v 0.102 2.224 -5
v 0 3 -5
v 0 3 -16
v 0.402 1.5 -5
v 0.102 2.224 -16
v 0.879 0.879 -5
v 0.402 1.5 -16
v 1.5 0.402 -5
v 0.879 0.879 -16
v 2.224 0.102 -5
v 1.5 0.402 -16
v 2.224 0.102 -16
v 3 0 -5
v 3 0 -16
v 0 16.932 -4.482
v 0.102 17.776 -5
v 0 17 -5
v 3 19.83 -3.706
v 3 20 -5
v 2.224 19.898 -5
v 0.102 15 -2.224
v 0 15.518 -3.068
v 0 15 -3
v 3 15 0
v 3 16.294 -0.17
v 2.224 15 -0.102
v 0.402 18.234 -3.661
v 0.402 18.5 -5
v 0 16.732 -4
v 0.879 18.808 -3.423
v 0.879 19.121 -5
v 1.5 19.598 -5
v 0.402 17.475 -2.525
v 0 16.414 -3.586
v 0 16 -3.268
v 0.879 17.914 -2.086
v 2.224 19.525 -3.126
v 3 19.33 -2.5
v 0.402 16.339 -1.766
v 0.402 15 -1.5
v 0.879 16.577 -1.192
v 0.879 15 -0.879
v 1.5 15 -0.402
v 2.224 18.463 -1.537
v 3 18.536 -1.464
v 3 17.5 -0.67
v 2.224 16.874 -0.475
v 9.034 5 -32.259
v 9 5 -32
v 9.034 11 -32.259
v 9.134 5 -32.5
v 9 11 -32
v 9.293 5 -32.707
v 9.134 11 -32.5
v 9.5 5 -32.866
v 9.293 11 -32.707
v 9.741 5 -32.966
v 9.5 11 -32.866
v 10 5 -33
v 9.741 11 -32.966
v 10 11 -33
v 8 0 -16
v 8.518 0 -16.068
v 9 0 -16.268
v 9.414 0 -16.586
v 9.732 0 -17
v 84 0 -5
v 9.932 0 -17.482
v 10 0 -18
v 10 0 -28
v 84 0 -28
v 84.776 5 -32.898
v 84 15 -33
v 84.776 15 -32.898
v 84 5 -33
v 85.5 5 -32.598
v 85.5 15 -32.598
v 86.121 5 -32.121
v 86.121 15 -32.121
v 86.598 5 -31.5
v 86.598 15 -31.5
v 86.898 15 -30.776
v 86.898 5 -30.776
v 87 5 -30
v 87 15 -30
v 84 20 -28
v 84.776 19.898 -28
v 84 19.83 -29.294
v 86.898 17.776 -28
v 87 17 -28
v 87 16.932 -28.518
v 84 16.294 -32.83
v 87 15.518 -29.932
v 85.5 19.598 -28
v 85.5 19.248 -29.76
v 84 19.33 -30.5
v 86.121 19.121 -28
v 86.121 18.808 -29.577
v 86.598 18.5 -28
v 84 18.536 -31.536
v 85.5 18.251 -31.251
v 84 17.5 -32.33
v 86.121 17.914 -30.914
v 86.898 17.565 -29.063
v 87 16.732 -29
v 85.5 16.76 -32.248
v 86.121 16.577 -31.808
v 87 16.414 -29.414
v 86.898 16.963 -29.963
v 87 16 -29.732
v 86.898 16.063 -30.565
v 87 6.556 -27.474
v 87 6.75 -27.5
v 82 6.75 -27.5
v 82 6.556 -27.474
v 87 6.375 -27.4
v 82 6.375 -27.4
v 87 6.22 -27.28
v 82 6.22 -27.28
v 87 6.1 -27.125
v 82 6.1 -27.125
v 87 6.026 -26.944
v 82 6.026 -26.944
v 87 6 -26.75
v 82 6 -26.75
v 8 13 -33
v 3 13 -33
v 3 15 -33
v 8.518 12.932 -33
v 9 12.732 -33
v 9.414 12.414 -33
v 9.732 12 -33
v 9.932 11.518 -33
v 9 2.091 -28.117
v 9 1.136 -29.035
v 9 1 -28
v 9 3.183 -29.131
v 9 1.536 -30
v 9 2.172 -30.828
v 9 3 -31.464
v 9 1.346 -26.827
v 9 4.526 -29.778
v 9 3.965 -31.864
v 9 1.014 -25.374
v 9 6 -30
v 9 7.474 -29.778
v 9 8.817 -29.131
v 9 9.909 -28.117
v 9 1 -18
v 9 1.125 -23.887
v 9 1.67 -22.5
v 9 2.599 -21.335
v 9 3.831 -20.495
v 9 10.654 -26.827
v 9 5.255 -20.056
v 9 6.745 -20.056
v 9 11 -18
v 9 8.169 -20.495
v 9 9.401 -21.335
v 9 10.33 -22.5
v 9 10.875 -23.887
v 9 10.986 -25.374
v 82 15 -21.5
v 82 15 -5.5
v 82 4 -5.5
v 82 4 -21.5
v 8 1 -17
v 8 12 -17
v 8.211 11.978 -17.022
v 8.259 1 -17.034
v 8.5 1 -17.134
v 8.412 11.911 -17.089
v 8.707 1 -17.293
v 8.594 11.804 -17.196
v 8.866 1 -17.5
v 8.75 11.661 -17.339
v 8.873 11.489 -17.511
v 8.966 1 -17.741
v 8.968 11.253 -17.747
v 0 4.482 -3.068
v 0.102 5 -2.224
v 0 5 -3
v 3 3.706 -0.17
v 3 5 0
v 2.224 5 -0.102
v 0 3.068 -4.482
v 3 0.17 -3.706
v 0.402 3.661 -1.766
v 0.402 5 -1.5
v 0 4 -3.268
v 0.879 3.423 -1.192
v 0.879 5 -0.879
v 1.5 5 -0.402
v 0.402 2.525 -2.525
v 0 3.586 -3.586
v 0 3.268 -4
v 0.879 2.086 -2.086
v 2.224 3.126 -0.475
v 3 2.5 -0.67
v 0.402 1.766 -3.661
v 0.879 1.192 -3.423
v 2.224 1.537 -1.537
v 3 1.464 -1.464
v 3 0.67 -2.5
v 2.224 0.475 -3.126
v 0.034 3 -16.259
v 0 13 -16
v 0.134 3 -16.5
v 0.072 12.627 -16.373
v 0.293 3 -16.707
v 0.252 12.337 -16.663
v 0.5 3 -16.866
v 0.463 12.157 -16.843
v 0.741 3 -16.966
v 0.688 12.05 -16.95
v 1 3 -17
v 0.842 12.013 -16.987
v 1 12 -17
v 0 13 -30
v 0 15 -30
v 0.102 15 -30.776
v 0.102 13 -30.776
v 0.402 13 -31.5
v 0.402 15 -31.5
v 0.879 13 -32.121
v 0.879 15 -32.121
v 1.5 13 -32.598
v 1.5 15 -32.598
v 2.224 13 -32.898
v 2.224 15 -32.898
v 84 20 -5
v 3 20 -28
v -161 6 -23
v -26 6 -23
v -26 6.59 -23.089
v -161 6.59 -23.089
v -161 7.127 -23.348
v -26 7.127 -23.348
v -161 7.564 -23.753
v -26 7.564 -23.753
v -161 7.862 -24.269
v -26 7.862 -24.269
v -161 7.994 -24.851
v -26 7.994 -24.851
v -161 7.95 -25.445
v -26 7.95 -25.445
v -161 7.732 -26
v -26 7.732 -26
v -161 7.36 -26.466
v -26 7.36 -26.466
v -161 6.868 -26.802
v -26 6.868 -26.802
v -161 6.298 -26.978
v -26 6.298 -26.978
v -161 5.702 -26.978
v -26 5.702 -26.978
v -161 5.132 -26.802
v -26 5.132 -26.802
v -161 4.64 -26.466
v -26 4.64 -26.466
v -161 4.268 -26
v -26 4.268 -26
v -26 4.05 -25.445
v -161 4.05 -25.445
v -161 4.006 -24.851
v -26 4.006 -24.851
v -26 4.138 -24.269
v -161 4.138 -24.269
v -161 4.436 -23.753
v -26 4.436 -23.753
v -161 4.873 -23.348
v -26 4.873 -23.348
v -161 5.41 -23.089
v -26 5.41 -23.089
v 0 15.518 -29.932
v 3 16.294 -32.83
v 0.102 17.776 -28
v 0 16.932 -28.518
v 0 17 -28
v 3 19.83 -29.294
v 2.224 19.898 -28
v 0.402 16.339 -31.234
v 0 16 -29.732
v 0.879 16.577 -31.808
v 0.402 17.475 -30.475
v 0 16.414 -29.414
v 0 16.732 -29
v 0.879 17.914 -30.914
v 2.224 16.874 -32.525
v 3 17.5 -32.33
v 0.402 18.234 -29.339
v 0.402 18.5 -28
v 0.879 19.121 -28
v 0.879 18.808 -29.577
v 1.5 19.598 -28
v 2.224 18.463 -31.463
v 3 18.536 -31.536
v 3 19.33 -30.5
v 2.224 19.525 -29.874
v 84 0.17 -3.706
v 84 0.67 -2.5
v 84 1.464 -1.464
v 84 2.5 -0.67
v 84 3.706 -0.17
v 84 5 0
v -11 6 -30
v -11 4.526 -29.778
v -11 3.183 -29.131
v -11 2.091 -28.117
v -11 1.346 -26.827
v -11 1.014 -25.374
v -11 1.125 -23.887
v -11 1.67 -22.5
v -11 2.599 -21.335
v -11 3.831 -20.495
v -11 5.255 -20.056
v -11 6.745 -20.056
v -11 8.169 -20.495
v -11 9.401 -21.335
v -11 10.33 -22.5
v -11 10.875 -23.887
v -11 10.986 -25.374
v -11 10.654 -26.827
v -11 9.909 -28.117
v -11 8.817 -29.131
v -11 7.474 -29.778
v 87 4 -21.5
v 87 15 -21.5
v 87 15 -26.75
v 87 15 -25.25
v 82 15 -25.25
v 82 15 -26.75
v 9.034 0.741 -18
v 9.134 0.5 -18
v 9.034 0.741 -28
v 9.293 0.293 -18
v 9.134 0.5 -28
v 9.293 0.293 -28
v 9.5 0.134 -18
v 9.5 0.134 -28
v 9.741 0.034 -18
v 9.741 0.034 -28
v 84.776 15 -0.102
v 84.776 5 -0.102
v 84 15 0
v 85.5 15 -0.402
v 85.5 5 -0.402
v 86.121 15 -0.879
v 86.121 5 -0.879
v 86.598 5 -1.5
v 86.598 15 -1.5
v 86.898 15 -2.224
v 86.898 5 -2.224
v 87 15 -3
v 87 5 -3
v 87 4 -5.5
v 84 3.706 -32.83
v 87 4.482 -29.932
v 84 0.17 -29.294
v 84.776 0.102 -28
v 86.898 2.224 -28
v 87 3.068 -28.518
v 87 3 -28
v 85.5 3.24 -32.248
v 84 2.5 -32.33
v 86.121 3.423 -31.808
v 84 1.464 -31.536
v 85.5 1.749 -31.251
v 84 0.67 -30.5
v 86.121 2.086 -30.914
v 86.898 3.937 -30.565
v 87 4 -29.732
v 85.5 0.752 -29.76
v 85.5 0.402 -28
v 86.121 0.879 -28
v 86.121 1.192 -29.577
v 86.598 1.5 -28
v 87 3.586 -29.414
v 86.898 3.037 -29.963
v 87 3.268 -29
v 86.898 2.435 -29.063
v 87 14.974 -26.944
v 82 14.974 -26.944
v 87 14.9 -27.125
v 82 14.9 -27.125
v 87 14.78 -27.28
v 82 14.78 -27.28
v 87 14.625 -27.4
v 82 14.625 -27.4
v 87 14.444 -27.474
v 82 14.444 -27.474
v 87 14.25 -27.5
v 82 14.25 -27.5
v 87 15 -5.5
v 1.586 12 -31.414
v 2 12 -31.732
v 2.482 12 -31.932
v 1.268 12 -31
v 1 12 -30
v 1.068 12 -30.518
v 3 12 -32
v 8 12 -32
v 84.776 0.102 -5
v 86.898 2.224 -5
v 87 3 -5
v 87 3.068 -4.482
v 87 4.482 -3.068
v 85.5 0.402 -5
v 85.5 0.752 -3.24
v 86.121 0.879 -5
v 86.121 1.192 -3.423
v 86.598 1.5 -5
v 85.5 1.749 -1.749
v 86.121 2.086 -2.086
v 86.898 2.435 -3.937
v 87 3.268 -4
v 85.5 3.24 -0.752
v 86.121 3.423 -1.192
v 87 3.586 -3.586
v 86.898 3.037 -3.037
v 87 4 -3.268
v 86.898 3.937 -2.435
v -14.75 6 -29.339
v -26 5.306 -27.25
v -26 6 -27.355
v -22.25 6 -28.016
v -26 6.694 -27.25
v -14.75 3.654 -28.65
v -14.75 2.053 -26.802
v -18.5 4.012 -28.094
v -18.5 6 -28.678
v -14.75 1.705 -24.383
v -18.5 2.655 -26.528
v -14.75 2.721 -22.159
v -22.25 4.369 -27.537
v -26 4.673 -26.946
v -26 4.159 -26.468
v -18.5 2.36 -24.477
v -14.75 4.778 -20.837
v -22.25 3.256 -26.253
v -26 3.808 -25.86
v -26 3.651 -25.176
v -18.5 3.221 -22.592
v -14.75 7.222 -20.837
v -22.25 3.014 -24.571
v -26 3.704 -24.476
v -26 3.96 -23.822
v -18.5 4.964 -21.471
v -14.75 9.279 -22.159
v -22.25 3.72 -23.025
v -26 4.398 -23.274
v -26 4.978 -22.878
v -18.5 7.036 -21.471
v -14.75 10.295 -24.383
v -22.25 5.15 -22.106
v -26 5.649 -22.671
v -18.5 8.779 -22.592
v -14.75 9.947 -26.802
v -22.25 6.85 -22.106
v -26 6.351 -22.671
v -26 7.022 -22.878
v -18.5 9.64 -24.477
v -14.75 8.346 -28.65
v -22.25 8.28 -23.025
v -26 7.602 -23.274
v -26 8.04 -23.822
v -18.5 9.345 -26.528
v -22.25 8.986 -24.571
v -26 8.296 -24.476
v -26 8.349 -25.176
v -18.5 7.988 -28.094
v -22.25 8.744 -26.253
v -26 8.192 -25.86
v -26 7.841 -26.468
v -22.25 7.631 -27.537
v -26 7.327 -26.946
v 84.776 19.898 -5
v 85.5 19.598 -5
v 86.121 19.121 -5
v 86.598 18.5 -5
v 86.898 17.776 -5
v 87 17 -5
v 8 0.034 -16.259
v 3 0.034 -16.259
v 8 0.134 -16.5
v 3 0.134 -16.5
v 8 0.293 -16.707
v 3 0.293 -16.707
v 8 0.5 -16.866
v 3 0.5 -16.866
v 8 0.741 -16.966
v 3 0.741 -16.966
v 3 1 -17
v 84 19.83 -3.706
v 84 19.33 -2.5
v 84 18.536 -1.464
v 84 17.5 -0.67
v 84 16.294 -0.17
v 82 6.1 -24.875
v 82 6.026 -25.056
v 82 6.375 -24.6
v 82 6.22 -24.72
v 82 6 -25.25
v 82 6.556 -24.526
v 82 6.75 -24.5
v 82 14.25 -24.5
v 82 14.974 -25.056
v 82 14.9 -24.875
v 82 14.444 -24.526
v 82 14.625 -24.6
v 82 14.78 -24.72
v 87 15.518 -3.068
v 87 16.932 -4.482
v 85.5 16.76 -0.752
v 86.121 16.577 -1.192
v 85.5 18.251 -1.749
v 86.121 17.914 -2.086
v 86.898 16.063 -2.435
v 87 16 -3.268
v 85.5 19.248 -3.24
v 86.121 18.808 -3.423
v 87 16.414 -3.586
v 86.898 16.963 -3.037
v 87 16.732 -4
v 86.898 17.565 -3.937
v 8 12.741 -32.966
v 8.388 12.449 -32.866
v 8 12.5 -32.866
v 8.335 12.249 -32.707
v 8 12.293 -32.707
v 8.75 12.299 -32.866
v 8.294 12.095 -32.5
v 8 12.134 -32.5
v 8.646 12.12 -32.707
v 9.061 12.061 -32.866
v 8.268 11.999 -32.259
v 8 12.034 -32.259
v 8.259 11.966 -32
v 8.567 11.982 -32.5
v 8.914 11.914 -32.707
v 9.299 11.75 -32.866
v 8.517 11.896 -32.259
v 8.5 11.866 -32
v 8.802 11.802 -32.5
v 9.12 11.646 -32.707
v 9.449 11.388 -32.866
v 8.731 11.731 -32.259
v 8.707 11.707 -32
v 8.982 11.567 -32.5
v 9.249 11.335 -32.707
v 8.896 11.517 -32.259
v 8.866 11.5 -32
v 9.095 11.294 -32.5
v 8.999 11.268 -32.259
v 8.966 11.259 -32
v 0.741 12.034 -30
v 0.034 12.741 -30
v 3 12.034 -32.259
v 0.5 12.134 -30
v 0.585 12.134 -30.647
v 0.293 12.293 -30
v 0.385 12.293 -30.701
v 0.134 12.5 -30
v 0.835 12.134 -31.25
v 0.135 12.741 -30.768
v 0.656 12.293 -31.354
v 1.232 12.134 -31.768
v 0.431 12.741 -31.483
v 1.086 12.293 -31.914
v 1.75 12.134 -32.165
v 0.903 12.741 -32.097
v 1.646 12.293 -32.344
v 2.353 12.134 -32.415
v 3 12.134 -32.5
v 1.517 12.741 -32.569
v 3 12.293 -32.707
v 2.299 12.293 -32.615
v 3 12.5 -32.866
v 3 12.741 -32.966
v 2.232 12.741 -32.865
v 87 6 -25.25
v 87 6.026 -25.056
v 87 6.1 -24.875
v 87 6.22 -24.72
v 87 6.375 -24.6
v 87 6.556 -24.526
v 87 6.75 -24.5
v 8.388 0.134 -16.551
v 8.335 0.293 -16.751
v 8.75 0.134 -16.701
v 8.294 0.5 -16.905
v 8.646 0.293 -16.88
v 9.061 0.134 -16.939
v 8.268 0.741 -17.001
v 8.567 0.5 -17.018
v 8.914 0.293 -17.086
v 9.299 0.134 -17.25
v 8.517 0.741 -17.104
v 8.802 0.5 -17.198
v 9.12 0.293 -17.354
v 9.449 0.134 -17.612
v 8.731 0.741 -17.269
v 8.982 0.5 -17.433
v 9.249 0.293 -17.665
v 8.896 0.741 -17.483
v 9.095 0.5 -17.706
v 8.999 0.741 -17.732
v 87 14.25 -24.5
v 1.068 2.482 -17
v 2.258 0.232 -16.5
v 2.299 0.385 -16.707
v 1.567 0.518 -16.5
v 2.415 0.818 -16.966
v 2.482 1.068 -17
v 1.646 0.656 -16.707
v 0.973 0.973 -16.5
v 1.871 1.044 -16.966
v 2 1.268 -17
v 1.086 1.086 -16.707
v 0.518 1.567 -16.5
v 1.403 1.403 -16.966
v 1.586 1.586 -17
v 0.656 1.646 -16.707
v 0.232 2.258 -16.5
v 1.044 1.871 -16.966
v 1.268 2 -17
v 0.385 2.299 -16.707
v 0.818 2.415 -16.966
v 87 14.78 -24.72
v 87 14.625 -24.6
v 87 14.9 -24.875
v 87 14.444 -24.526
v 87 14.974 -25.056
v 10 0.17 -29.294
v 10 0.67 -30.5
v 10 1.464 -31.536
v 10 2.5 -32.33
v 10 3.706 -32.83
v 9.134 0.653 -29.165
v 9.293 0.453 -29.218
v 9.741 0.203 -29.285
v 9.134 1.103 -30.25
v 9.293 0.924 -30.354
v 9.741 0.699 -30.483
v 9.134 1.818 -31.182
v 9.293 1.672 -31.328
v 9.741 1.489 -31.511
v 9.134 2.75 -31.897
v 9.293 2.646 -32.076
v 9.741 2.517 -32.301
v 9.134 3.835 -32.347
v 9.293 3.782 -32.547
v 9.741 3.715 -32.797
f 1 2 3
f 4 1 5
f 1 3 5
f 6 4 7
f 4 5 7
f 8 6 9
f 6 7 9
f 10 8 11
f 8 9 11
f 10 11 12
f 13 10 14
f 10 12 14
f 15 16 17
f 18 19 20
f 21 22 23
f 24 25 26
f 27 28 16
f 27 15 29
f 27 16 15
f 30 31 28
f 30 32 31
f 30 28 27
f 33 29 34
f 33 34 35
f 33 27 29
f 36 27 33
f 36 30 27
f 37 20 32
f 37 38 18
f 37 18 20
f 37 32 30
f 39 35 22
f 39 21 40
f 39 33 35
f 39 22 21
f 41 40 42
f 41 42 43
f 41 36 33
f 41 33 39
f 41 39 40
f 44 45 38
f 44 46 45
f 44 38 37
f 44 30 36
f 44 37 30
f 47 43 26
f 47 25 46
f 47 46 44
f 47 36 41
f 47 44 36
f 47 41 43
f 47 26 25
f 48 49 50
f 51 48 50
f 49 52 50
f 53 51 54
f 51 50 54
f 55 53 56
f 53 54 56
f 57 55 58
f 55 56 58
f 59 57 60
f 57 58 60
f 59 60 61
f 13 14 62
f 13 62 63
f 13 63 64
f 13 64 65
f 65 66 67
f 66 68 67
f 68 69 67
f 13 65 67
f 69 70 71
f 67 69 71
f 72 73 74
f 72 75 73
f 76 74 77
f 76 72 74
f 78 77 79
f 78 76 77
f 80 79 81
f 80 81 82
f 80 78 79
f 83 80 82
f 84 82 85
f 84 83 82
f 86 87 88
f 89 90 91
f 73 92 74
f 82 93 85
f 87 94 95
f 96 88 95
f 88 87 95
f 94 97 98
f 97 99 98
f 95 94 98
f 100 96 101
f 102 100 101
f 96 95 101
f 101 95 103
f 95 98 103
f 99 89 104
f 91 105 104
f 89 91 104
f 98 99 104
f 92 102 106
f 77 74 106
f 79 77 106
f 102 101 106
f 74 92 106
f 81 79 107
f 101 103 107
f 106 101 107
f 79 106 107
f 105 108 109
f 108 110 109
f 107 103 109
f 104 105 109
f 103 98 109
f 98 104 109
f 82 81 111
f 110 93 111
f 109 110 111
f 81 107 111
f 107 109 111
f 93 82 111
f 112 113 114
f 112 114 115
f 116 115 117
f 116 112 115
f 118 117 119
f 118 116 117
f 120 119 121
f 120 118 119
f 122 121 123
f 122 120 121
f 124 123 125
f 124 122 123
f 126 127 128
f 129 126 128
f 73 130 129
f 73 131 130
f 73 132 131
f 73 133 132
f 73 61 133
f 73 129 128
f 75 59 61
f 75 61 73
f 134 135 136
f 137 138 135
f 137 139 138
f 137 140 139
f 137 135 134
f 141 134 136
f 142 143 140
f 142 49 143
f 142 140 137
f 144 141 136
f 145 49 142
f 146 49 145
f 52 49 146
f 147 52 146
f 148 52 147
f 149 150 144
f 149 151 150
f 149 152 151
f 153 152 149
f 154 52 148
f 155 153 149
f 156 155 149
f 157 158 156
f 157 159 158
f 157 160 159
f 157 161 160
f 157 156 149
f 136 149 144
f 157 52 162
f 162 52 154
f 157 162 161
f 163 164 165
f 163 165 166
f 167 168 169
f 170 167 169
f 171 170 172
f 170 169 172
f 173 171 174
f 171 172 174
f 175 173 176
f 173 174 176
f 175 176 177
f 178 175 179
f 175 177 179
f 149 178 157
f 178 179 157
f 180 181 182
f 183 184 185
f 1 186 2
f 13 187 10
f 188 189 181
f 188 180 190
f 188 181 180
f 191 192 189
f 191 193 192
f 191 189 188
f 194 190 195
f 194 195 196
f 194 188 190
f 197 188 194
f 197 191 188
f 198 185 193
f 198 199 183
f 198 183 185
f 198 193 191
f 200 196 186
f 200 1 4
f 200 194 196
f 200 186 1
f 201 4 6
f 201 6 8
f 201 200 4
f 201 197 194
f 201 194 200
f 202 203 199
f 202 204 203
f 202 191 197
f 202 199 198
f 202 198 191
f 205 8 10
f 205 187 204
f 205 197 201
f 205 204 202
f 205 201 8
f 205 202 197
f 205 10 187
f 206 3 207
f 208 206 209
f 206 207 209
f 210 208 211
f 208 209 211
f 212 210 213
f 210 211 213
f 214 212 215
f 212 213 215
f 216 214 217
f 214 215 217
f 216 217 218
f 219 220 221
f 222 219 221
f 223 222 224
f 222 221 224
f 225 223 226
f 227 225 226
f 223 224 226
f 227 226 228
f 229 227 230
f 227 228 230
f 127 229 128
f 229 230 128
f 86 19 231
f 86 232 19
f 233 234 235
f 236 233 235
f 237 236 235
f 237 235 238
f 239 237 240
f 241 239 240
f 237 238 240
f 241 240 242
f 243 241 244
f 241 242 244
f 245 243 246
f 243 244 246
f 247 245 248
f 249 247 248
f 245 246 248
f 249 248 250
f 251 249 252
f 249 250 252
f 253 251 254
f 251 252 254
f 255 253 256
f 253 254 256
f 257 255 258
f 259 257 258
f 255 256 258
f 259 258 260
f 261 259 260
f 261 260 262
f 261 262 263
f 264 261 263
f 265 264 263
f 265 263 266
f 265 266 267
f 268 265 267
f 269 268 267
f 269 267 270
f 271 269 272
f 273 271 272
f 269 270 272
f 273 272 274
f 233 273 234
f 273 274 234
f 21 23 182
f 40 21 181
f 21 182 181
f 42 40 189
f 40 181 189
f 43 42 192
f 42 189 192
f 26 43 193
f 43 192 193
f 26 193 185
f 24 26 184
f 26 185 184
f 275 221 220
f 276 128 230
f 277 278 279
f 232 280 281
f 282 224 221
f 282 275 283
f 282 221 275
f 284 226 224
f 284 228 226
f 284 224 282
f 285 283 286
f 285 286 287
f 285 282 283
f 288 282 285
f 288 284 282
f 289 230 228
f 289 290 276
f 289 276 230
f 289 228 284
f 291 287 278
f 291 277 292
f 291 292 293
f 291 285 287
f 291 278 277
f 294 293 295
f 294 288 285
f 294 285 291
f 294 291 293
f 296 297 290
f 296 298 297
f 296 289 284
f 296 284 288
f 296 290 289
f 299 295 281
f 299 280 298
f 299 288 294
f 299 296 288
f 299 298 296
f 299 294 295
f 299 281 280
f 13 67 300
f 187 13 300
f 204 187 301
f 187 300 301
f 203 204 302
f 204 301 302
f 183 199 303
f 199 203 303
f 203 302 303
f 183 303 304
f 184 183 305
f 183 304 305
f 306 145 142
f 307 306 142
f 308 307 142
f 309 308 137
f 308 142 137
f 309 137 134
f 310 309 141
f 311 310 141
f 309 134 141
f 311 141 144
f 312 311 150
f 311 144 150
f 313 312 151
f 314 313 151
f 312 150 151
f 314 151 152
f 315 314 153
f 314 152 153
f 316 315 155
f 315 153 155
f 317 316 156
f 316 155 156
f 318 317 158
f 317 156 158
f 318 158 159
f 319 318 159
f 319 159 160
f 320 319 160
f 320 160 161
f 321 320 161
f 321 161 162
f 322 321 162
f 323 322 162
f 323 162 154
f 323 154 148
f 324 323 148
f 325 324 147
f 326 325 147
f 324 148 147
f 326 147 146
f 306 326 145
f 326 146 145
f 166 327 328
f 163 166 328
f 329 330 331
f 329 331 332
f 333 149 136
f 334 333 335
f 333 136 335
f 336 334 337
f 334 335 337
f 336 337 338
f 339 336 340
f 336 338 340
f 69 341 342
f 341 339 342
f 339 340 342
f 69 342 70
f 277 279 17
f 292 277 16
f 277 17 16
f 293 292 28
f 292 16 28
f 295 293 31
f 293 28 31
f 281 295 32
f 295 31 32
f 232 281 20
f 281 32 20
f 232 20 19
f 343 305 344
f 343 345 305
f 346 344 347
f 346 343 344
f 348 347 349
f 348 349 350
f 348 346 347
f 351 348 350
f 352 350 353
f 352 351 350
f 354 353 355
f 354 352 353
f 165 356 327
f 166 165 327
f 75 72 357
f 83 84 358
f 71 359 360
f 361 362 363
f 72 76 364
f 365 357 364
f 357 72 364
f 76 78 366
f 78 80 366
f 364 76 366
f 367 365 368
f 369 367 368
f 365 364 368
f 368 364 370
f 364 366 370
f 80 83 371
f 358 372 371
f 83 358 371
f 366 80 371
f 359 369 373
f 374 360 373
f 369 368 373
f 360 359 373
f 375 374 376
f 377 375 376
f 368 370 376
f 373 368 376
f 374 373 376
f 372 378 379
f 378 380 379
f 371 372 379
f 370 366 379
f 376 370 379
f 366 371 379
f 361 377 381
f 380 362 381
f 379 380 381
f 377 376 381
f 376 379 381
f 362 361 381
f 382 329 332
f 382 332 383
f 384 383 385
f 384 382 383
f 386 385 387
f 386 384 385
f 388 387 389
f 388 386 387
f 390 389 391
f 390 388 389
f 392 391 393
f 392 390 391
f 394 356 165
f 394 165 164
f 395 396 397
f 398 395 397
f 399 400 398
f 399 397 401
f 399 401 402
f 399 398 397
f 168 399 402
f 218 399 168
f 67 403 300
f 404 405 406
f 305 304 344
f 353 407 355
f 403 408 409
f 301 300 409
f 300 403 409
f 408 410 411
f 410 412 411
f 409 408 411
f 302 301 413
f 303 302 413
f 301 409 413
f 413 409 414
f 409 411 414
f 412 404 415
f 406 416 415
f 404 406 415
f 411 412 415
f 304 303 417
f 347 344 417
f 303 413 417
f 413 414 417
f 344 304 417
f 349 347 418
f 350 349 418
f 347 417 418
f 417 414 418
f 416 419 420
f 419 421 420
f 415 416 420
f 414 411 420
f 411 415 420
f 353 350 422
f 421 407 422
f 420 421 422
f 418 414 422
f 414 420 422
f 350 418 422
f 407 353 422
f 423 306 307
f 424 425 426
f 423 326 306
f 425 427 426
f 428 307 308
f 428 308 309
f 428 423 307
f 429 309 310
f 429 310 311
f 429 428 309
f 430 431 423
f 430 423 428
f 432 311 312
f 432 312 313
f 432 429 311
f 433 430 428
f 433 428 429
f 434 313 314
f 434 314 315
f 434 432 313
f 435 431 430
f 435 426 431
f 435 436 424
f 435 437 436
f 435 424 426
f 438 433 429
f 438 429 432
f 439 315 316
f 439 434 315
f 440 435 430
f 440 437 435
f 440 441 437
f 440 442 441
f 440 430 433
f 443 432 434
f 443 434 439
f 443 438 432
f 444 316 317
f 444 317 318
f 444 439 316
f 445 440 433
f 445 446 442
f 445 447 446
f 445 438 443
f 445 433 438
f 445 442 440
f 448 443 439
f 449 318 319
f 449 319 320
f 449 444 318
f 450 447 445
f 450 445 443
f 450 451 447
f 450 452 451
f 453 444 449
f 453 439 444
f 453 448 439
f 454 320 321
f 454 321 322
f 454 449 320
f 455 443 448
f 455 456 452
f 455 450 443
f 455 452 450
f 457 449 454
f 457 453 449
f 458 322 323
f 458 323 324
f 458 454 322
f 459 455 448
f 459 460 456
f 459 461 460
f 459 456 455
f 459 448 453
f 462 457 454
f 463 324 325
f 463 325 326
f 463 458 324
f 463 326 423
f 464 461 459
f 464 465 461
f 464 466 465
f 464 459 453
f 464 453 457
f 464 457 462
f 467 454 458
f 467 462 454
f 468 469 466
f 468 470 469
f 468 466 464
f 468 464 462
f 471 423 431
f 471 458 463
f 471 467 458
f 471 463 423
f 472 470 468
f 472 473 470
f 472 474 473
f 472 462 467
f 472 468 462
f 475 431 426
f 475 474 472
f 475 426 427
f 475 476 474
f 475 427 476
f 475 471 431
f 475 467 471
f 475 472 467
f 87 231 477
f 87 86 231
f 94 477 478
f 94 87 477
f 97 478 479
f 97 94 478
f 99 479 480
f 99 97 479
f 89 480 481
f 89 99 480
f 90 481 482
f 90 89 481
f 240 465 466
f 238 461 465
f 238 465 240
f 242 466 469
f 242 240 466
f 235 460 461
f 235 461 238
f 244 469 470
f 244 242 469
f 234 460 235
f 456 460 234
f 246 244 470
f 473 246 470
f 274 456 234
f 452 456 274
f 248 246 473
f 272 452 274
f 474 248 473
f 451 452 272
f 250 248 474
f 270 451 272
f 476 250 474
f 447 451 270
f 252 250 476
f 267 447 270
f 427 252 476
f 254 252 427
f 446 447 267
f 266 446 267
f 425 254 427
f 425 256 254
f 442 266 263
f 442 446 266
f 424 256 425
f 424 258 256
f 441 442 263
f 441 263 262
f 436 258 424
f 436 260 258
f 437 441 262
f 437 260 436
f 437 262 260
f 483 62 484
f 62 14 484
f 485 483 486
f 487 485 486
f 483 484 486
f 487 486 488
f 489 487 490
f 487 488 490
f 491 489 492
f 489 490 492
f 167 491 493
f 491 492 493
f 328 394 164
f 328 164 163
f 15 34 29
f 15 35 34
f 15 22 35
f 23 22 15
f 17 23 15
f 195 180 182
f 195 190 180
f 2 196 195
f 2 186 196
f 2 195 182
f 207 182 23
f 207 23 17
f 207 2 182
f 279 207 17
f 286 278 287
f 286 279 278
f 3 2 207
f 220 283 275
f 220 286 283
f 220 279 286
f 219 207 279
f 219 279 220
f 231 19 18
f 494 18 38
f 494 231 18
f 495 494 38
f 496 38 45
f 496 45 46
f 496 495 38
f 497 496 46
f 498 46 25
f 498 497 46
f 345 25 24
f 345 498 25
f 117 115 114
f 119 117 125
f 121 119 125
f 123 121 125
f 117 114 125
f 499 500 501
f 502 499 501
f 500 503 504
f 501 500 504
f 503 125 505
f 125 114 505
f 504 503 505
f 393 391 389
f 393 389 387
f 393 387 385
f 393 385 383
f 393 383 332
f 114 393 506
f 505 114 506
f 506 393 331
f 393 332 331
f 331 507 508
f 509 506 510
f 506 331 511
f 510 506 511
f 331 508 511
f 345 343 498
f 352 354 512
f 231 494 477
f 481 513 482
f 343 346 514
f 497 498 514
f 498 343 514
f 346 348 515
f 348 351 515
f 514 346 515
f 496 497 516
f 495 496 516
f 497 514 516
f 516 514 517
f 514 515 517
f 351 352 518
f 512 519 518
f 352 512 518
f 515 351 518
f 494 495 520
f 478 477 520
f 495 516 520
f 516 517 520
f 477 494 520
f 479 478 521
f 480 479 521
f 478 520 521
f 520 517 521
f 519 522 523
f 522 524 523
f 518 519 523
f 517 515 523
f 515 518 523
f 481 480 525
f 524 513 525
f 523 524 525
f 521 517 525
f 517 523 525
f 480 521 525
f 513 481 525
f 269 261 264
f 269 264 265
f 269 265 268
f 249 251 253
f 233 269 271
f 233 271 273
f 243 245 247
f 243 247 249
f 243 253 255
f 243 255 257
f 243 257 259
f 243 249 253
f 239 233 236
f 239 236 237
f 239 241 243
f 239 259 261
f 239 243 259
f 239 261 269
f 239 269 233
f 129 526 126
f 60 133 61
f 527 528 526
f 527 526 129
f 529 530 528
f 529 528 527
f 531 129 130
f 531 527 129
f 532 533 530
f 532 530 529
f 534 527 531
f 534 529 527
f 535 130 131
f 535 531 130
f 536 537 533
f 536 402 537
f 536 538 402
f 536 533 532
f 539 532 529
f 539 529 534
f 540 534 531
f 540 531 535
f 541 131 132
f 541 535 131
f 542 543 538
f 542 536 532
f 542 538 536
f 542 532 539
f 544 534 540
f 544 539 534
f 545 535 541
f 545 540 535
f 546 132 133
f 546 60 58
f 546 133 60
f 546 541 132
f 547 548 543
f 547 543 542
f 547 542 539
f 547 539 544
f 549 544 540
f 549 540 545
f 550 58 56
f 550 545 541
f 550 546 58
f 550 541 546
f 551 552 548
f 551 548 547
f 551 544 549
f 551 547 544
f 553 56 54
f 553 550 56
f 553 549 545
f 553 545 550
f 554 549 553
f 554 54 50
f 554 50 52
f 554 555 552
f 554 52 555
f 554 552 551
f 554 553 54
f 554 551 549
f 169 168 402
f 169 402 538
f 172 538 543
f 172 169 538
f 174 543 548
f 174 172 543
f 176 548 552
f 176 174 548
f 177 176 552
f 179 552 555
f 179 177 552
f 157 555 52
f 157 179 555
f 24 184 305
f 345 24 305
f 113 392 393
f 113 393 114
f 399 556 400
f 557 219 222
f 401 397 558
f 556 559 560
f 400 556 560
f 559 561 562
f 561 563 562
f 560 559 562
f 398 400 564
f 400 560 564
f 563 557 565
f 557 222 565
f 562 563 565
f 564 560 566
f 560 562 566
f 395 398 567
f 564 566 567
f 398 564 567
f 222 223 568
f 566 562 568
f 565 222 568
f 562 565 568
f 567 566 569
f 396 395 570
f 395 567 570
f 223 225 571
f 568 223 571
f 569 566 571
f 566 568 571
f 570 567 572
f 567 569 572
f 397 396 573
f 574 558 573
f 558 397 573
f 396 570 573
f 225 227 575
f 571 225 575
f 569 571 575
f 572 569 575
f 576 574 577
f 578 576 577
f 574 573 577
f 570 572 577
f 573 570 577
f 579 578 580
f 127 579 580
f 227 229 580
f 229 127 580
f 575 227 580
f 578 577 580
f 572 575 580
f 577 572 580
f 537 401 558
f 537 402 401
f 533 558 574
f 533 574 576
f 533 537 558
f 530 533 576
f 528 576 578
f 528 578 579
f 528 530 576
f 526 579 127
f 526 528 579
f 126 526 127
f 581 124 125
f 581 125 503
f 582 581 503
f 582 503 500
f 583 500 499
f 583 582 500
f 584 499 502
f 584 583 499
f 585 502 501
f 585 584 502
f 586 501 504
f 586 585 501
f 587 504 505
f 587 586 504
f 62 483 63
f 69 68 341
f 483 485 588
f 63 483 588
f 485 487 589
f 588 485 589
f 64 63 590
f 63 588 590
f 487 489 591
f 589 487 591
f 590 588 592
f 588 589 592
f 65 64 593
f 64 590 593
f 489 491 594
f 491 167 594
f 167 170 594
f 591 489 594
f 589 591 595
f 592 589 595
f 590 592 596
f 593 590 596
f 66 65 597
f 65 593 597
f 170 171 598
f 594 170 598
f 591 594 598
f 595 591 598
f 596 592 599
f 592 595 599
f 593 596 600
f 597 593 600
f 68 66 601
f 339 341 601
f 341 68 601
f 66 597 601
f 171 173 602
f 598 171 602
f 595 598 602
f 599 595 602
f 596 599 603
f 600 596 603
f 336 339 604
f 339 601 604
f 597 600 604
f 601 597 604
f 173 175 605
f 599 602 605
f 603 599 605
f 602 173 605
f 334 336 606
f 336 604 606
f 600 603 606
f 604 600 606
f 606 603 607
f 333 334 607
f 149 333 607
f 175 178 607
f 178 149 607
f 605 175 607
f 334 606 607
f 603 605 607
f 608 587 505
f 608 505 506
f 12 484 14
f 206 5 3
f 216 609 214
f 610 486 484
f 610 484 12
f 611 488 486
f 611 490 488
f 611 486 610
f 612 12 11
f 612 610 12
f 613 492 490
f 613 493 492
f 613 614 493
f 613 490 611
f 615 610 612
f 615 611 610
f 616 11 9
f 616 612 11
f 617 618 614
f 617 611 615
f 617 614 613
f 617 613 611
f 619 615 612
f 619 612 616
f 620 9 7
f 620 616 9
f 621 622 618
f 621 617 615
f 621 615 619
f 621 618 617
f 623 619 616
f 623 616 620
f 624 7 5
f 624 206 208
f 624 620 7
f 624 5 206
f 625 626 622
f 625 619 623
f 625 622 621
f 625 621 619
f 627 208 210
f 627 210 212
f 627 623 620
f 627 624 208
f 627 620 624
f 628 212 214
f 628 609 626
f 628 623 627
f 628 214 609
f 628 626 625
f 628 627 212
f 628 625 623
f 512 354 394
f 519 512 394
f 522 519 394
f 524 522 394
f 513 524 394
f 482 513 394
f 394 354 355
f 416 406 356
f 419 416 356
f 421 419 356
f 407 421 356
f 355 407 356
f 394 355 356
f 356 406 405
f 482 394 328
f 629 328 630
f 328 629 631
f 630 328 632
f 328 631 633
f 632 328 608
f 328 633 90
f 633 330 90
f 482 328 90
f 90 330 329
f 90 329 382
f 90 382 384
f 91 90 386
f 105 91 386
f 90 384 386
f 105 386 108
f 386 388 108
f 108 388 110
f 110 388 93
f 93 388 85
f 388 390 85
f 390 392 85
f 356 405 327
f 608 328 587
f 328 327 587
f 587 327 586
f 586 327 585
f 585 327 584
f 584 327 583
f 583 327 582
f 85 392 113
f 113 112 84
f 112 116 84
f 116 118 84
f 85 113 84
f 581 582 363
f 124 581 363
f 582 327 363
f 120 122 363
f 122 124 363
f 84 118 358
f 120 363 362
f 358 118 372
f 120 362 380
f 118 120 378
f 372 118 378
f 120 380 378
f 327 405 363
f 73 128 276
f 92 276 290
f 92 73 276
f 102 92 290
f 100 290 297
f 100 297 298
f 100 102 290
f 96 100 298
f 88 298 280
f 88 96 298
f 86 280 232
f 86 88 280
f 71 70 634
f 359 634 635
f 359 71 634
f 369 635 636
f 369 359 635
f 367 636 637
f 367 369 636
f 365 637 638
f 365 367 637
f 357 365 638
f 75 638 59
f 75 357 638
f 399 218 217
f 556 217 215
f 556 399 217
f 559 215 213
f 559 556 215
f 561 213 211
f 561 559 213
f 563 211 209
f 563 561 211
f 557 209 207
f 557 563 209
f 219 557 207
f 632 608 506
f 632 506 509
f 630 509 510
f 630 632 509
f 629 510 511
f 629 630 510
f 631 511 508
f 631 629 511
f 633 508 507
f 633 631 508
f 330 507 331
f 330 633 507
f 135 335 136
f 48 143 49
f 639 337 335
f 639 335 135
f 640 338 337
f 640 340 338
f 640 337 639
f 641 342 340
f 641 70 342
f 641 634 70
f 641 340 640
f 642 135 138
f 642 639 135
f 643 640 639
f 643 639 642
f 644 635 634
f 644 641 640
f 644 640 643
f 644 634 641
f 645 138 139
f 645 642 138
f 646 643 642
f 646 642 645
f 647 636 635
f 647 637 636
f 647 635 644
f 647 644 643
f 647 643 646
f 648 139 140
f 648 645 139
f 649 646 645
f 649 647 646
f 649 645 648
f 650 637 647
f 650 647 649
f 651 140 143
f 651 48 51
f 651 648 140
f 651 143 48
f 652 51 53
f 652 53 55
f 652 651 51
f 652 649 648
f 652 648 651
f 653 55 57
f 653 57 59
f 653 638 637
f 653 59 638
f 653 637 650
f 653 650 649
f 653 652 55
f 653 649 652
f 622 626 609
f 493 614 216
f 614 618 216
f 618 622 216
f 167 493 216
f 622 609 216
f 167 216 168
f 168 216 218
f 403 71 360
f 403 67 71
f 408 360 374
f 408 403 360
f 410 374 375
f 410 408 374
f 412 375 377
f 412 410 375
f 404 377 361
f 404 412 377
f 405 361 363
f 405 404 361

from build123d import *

# Parameters (mm, degrees)
SKETCH1_W           = 87
SKETCH1_H           = 33
BOSS_EXTRUDE1_DEPTH = 20
SKETCH3_W           = 16
SKETCH3_H           = 12
CUT_EXTRUDE1_DEPTH  = 9
SKETCH4_R           = 5
BOSS_EXTRUDE2_DEPTH = 35
SKETCH5_R           = 2
BOSS_EXTRUDE3_DEPTH = 135
SKETCH6_W           = 16
SKETCH6_H           = 11
CUT_EXTRUDE2_DEPTH  = 5
FILLET1_R           = 5
FILLET2_R           = 3
FILLET3_R           = 1
CHAMFER2_SIZE       = 15
CHAMFER2_SIZE2      = 2.644904711


with BuildPart() as part:
    # Sketch1 → Boss-Extrude1 (new body)
    with BuildSketch(Plane(origin=(0, 0, 0), x_dir=(1, 0, 0), z_dir=(0, 1, 0))):
        with Locations((43.5, 16.5)):
            Rectangle(SKETCH1_W, SKETCH1_H)
    extrude(amount=BOSS_EXTRUDE1_DEPTH)

    # Sketch3 → Cut-Extrude1 (cut)
    with BuildSketch(Plane.ZY):
        with Locations((-25, 6)):
            Rectangle(SKETCH3_W, SKETCH3_H)
    extrude(amount=-CUT_EXTRUDE1_DEPTH, mode=Mode.SUBTRACT)

    # Sketch4 → Boss-Extrude2 (add)
    with BuildSketch(Plane.ZY.offset(-9)):
        with Locations(Location((-25, 6, 0), (0, 0, 180))):
            Circle(SKETCH4_R)
    extrude(amount=BOSS_EXTRUDE2_DEPTH)

    # Sketch5 → Boss-Extrude3 (add)
    with BuildSketch(Plane.ZY.offset(26)):
        with Locations((-25, 6)):
            Circle(SKETCH5_R)
    extrude(amount=BOSS_EXTRUDE3_DEPTH)

    # Sketch6 → Cut-Extrude2 (cut)
    with BuildSketch(Plane(origin=(87, 0, 0), x_dir=(0, 0, -1), z_dir=(1, 0, 0))):
        with Locations((13.5, 9.5)):
            Rectangle(SKETCH6_W, SKETCH6_H)
        with BuildLine():
            Line((25.25, 15), (26.75, 15))
            ThreePointArc((26.75, 15), (27.280330086, 14.780330086), (27.5, 14.25))
            Line((27.5, 14.25), (27.5, 6.75))
            ThreePointArc((27.5, 6.75), (27.280330086, 6.219669914), (26.75, 6))
            Line((26.75, 6), (25.25, 6))
            ThreePointArc((25.25, 6), (24.719669914, 6.219669914), (24.5, 6.75))
            Line((24.5, 6.75), (24.5, 14.25))
            ThreePointArc((24.5, 14.25), (24.719669914, 14.780330086), (25.25, 15))
        make_face()
    extrude(amount=-CUT_EXTRUDE2_DEPTH, mode=Mode.SUBTRACT)

    # Fillet1
    fillet1_edges = [part.edges().sort_by_distance(p)[0] for p in [
        (43.5, 20, -33),
        (48, 0, -33),
        (43.5, 0, 0),
        (43.5, 20, 0),
    ]]
    fillet(fillet1_edges, radius=FILLET1_R)

    # Fillet2
    fillet2_edges = [part.edges().sort_by_distance(p)[0] for p in [
        (0, 0, -11),
        (0, 20, -16.5),
        (87, 20, -16.5),
        (0, 10, 0),
        (0, 13.5, -33),
        (0, 1.464466094, -1.464466094),
        (0, 18.535533906, -1.464466094),
        (0, 18.535533906, -31.535533906),
        (87, 10, -33),
        (87, 0, -16.5),
        (87, 10, 0),
        (87, 1.464466094, -31.535533906),
        (87, 1.464466094, -1.464466094),
        (87, 18.535533906, -1.464466094),
        (87, 18.535533906, -31.535533906),
    ]]
    fillet(fillet2_edges, radius=FILLET2_R)

    # Fillet3
    fillet3_edges = [part.edges().sort_by_distance(p)[0] for p in [
        (0, 7.5, -17),
        (0.878679656, 12, -32.121320344),
        (0.878679656, 0.878679656, -17),
        (9, 8.5, -33),
        (9, 12, -25),
        (6, 12, -33),
        (9, 6, -17),
        (6, 0, -17),
        (0, 12, -23.5),
        (9, 0, -22.5),
        (9, 1.464466094, -31.535533906),
    ]]
    fillet(fillet3_edges, radius=FILLET3_R - 0.0001)  # a hair under: the kernel refuses the full size

    # Chamfer2
    chamfer2_edges = [part.edges().sort_by_distance(p)[0] for p in [
        (-26, 6, -20),
    ]]
    chamfer2_side = [part.faces().sort_by_distance(p)[0] for p in [
        (-8.5, 6, -20),
    ]]
    chamfer(chamfer2_edges, length=CHAMFER2_SIZE, length2=CHAMFER2_SIZE2, reference=chamfer2_side[0])


solid = part.part
